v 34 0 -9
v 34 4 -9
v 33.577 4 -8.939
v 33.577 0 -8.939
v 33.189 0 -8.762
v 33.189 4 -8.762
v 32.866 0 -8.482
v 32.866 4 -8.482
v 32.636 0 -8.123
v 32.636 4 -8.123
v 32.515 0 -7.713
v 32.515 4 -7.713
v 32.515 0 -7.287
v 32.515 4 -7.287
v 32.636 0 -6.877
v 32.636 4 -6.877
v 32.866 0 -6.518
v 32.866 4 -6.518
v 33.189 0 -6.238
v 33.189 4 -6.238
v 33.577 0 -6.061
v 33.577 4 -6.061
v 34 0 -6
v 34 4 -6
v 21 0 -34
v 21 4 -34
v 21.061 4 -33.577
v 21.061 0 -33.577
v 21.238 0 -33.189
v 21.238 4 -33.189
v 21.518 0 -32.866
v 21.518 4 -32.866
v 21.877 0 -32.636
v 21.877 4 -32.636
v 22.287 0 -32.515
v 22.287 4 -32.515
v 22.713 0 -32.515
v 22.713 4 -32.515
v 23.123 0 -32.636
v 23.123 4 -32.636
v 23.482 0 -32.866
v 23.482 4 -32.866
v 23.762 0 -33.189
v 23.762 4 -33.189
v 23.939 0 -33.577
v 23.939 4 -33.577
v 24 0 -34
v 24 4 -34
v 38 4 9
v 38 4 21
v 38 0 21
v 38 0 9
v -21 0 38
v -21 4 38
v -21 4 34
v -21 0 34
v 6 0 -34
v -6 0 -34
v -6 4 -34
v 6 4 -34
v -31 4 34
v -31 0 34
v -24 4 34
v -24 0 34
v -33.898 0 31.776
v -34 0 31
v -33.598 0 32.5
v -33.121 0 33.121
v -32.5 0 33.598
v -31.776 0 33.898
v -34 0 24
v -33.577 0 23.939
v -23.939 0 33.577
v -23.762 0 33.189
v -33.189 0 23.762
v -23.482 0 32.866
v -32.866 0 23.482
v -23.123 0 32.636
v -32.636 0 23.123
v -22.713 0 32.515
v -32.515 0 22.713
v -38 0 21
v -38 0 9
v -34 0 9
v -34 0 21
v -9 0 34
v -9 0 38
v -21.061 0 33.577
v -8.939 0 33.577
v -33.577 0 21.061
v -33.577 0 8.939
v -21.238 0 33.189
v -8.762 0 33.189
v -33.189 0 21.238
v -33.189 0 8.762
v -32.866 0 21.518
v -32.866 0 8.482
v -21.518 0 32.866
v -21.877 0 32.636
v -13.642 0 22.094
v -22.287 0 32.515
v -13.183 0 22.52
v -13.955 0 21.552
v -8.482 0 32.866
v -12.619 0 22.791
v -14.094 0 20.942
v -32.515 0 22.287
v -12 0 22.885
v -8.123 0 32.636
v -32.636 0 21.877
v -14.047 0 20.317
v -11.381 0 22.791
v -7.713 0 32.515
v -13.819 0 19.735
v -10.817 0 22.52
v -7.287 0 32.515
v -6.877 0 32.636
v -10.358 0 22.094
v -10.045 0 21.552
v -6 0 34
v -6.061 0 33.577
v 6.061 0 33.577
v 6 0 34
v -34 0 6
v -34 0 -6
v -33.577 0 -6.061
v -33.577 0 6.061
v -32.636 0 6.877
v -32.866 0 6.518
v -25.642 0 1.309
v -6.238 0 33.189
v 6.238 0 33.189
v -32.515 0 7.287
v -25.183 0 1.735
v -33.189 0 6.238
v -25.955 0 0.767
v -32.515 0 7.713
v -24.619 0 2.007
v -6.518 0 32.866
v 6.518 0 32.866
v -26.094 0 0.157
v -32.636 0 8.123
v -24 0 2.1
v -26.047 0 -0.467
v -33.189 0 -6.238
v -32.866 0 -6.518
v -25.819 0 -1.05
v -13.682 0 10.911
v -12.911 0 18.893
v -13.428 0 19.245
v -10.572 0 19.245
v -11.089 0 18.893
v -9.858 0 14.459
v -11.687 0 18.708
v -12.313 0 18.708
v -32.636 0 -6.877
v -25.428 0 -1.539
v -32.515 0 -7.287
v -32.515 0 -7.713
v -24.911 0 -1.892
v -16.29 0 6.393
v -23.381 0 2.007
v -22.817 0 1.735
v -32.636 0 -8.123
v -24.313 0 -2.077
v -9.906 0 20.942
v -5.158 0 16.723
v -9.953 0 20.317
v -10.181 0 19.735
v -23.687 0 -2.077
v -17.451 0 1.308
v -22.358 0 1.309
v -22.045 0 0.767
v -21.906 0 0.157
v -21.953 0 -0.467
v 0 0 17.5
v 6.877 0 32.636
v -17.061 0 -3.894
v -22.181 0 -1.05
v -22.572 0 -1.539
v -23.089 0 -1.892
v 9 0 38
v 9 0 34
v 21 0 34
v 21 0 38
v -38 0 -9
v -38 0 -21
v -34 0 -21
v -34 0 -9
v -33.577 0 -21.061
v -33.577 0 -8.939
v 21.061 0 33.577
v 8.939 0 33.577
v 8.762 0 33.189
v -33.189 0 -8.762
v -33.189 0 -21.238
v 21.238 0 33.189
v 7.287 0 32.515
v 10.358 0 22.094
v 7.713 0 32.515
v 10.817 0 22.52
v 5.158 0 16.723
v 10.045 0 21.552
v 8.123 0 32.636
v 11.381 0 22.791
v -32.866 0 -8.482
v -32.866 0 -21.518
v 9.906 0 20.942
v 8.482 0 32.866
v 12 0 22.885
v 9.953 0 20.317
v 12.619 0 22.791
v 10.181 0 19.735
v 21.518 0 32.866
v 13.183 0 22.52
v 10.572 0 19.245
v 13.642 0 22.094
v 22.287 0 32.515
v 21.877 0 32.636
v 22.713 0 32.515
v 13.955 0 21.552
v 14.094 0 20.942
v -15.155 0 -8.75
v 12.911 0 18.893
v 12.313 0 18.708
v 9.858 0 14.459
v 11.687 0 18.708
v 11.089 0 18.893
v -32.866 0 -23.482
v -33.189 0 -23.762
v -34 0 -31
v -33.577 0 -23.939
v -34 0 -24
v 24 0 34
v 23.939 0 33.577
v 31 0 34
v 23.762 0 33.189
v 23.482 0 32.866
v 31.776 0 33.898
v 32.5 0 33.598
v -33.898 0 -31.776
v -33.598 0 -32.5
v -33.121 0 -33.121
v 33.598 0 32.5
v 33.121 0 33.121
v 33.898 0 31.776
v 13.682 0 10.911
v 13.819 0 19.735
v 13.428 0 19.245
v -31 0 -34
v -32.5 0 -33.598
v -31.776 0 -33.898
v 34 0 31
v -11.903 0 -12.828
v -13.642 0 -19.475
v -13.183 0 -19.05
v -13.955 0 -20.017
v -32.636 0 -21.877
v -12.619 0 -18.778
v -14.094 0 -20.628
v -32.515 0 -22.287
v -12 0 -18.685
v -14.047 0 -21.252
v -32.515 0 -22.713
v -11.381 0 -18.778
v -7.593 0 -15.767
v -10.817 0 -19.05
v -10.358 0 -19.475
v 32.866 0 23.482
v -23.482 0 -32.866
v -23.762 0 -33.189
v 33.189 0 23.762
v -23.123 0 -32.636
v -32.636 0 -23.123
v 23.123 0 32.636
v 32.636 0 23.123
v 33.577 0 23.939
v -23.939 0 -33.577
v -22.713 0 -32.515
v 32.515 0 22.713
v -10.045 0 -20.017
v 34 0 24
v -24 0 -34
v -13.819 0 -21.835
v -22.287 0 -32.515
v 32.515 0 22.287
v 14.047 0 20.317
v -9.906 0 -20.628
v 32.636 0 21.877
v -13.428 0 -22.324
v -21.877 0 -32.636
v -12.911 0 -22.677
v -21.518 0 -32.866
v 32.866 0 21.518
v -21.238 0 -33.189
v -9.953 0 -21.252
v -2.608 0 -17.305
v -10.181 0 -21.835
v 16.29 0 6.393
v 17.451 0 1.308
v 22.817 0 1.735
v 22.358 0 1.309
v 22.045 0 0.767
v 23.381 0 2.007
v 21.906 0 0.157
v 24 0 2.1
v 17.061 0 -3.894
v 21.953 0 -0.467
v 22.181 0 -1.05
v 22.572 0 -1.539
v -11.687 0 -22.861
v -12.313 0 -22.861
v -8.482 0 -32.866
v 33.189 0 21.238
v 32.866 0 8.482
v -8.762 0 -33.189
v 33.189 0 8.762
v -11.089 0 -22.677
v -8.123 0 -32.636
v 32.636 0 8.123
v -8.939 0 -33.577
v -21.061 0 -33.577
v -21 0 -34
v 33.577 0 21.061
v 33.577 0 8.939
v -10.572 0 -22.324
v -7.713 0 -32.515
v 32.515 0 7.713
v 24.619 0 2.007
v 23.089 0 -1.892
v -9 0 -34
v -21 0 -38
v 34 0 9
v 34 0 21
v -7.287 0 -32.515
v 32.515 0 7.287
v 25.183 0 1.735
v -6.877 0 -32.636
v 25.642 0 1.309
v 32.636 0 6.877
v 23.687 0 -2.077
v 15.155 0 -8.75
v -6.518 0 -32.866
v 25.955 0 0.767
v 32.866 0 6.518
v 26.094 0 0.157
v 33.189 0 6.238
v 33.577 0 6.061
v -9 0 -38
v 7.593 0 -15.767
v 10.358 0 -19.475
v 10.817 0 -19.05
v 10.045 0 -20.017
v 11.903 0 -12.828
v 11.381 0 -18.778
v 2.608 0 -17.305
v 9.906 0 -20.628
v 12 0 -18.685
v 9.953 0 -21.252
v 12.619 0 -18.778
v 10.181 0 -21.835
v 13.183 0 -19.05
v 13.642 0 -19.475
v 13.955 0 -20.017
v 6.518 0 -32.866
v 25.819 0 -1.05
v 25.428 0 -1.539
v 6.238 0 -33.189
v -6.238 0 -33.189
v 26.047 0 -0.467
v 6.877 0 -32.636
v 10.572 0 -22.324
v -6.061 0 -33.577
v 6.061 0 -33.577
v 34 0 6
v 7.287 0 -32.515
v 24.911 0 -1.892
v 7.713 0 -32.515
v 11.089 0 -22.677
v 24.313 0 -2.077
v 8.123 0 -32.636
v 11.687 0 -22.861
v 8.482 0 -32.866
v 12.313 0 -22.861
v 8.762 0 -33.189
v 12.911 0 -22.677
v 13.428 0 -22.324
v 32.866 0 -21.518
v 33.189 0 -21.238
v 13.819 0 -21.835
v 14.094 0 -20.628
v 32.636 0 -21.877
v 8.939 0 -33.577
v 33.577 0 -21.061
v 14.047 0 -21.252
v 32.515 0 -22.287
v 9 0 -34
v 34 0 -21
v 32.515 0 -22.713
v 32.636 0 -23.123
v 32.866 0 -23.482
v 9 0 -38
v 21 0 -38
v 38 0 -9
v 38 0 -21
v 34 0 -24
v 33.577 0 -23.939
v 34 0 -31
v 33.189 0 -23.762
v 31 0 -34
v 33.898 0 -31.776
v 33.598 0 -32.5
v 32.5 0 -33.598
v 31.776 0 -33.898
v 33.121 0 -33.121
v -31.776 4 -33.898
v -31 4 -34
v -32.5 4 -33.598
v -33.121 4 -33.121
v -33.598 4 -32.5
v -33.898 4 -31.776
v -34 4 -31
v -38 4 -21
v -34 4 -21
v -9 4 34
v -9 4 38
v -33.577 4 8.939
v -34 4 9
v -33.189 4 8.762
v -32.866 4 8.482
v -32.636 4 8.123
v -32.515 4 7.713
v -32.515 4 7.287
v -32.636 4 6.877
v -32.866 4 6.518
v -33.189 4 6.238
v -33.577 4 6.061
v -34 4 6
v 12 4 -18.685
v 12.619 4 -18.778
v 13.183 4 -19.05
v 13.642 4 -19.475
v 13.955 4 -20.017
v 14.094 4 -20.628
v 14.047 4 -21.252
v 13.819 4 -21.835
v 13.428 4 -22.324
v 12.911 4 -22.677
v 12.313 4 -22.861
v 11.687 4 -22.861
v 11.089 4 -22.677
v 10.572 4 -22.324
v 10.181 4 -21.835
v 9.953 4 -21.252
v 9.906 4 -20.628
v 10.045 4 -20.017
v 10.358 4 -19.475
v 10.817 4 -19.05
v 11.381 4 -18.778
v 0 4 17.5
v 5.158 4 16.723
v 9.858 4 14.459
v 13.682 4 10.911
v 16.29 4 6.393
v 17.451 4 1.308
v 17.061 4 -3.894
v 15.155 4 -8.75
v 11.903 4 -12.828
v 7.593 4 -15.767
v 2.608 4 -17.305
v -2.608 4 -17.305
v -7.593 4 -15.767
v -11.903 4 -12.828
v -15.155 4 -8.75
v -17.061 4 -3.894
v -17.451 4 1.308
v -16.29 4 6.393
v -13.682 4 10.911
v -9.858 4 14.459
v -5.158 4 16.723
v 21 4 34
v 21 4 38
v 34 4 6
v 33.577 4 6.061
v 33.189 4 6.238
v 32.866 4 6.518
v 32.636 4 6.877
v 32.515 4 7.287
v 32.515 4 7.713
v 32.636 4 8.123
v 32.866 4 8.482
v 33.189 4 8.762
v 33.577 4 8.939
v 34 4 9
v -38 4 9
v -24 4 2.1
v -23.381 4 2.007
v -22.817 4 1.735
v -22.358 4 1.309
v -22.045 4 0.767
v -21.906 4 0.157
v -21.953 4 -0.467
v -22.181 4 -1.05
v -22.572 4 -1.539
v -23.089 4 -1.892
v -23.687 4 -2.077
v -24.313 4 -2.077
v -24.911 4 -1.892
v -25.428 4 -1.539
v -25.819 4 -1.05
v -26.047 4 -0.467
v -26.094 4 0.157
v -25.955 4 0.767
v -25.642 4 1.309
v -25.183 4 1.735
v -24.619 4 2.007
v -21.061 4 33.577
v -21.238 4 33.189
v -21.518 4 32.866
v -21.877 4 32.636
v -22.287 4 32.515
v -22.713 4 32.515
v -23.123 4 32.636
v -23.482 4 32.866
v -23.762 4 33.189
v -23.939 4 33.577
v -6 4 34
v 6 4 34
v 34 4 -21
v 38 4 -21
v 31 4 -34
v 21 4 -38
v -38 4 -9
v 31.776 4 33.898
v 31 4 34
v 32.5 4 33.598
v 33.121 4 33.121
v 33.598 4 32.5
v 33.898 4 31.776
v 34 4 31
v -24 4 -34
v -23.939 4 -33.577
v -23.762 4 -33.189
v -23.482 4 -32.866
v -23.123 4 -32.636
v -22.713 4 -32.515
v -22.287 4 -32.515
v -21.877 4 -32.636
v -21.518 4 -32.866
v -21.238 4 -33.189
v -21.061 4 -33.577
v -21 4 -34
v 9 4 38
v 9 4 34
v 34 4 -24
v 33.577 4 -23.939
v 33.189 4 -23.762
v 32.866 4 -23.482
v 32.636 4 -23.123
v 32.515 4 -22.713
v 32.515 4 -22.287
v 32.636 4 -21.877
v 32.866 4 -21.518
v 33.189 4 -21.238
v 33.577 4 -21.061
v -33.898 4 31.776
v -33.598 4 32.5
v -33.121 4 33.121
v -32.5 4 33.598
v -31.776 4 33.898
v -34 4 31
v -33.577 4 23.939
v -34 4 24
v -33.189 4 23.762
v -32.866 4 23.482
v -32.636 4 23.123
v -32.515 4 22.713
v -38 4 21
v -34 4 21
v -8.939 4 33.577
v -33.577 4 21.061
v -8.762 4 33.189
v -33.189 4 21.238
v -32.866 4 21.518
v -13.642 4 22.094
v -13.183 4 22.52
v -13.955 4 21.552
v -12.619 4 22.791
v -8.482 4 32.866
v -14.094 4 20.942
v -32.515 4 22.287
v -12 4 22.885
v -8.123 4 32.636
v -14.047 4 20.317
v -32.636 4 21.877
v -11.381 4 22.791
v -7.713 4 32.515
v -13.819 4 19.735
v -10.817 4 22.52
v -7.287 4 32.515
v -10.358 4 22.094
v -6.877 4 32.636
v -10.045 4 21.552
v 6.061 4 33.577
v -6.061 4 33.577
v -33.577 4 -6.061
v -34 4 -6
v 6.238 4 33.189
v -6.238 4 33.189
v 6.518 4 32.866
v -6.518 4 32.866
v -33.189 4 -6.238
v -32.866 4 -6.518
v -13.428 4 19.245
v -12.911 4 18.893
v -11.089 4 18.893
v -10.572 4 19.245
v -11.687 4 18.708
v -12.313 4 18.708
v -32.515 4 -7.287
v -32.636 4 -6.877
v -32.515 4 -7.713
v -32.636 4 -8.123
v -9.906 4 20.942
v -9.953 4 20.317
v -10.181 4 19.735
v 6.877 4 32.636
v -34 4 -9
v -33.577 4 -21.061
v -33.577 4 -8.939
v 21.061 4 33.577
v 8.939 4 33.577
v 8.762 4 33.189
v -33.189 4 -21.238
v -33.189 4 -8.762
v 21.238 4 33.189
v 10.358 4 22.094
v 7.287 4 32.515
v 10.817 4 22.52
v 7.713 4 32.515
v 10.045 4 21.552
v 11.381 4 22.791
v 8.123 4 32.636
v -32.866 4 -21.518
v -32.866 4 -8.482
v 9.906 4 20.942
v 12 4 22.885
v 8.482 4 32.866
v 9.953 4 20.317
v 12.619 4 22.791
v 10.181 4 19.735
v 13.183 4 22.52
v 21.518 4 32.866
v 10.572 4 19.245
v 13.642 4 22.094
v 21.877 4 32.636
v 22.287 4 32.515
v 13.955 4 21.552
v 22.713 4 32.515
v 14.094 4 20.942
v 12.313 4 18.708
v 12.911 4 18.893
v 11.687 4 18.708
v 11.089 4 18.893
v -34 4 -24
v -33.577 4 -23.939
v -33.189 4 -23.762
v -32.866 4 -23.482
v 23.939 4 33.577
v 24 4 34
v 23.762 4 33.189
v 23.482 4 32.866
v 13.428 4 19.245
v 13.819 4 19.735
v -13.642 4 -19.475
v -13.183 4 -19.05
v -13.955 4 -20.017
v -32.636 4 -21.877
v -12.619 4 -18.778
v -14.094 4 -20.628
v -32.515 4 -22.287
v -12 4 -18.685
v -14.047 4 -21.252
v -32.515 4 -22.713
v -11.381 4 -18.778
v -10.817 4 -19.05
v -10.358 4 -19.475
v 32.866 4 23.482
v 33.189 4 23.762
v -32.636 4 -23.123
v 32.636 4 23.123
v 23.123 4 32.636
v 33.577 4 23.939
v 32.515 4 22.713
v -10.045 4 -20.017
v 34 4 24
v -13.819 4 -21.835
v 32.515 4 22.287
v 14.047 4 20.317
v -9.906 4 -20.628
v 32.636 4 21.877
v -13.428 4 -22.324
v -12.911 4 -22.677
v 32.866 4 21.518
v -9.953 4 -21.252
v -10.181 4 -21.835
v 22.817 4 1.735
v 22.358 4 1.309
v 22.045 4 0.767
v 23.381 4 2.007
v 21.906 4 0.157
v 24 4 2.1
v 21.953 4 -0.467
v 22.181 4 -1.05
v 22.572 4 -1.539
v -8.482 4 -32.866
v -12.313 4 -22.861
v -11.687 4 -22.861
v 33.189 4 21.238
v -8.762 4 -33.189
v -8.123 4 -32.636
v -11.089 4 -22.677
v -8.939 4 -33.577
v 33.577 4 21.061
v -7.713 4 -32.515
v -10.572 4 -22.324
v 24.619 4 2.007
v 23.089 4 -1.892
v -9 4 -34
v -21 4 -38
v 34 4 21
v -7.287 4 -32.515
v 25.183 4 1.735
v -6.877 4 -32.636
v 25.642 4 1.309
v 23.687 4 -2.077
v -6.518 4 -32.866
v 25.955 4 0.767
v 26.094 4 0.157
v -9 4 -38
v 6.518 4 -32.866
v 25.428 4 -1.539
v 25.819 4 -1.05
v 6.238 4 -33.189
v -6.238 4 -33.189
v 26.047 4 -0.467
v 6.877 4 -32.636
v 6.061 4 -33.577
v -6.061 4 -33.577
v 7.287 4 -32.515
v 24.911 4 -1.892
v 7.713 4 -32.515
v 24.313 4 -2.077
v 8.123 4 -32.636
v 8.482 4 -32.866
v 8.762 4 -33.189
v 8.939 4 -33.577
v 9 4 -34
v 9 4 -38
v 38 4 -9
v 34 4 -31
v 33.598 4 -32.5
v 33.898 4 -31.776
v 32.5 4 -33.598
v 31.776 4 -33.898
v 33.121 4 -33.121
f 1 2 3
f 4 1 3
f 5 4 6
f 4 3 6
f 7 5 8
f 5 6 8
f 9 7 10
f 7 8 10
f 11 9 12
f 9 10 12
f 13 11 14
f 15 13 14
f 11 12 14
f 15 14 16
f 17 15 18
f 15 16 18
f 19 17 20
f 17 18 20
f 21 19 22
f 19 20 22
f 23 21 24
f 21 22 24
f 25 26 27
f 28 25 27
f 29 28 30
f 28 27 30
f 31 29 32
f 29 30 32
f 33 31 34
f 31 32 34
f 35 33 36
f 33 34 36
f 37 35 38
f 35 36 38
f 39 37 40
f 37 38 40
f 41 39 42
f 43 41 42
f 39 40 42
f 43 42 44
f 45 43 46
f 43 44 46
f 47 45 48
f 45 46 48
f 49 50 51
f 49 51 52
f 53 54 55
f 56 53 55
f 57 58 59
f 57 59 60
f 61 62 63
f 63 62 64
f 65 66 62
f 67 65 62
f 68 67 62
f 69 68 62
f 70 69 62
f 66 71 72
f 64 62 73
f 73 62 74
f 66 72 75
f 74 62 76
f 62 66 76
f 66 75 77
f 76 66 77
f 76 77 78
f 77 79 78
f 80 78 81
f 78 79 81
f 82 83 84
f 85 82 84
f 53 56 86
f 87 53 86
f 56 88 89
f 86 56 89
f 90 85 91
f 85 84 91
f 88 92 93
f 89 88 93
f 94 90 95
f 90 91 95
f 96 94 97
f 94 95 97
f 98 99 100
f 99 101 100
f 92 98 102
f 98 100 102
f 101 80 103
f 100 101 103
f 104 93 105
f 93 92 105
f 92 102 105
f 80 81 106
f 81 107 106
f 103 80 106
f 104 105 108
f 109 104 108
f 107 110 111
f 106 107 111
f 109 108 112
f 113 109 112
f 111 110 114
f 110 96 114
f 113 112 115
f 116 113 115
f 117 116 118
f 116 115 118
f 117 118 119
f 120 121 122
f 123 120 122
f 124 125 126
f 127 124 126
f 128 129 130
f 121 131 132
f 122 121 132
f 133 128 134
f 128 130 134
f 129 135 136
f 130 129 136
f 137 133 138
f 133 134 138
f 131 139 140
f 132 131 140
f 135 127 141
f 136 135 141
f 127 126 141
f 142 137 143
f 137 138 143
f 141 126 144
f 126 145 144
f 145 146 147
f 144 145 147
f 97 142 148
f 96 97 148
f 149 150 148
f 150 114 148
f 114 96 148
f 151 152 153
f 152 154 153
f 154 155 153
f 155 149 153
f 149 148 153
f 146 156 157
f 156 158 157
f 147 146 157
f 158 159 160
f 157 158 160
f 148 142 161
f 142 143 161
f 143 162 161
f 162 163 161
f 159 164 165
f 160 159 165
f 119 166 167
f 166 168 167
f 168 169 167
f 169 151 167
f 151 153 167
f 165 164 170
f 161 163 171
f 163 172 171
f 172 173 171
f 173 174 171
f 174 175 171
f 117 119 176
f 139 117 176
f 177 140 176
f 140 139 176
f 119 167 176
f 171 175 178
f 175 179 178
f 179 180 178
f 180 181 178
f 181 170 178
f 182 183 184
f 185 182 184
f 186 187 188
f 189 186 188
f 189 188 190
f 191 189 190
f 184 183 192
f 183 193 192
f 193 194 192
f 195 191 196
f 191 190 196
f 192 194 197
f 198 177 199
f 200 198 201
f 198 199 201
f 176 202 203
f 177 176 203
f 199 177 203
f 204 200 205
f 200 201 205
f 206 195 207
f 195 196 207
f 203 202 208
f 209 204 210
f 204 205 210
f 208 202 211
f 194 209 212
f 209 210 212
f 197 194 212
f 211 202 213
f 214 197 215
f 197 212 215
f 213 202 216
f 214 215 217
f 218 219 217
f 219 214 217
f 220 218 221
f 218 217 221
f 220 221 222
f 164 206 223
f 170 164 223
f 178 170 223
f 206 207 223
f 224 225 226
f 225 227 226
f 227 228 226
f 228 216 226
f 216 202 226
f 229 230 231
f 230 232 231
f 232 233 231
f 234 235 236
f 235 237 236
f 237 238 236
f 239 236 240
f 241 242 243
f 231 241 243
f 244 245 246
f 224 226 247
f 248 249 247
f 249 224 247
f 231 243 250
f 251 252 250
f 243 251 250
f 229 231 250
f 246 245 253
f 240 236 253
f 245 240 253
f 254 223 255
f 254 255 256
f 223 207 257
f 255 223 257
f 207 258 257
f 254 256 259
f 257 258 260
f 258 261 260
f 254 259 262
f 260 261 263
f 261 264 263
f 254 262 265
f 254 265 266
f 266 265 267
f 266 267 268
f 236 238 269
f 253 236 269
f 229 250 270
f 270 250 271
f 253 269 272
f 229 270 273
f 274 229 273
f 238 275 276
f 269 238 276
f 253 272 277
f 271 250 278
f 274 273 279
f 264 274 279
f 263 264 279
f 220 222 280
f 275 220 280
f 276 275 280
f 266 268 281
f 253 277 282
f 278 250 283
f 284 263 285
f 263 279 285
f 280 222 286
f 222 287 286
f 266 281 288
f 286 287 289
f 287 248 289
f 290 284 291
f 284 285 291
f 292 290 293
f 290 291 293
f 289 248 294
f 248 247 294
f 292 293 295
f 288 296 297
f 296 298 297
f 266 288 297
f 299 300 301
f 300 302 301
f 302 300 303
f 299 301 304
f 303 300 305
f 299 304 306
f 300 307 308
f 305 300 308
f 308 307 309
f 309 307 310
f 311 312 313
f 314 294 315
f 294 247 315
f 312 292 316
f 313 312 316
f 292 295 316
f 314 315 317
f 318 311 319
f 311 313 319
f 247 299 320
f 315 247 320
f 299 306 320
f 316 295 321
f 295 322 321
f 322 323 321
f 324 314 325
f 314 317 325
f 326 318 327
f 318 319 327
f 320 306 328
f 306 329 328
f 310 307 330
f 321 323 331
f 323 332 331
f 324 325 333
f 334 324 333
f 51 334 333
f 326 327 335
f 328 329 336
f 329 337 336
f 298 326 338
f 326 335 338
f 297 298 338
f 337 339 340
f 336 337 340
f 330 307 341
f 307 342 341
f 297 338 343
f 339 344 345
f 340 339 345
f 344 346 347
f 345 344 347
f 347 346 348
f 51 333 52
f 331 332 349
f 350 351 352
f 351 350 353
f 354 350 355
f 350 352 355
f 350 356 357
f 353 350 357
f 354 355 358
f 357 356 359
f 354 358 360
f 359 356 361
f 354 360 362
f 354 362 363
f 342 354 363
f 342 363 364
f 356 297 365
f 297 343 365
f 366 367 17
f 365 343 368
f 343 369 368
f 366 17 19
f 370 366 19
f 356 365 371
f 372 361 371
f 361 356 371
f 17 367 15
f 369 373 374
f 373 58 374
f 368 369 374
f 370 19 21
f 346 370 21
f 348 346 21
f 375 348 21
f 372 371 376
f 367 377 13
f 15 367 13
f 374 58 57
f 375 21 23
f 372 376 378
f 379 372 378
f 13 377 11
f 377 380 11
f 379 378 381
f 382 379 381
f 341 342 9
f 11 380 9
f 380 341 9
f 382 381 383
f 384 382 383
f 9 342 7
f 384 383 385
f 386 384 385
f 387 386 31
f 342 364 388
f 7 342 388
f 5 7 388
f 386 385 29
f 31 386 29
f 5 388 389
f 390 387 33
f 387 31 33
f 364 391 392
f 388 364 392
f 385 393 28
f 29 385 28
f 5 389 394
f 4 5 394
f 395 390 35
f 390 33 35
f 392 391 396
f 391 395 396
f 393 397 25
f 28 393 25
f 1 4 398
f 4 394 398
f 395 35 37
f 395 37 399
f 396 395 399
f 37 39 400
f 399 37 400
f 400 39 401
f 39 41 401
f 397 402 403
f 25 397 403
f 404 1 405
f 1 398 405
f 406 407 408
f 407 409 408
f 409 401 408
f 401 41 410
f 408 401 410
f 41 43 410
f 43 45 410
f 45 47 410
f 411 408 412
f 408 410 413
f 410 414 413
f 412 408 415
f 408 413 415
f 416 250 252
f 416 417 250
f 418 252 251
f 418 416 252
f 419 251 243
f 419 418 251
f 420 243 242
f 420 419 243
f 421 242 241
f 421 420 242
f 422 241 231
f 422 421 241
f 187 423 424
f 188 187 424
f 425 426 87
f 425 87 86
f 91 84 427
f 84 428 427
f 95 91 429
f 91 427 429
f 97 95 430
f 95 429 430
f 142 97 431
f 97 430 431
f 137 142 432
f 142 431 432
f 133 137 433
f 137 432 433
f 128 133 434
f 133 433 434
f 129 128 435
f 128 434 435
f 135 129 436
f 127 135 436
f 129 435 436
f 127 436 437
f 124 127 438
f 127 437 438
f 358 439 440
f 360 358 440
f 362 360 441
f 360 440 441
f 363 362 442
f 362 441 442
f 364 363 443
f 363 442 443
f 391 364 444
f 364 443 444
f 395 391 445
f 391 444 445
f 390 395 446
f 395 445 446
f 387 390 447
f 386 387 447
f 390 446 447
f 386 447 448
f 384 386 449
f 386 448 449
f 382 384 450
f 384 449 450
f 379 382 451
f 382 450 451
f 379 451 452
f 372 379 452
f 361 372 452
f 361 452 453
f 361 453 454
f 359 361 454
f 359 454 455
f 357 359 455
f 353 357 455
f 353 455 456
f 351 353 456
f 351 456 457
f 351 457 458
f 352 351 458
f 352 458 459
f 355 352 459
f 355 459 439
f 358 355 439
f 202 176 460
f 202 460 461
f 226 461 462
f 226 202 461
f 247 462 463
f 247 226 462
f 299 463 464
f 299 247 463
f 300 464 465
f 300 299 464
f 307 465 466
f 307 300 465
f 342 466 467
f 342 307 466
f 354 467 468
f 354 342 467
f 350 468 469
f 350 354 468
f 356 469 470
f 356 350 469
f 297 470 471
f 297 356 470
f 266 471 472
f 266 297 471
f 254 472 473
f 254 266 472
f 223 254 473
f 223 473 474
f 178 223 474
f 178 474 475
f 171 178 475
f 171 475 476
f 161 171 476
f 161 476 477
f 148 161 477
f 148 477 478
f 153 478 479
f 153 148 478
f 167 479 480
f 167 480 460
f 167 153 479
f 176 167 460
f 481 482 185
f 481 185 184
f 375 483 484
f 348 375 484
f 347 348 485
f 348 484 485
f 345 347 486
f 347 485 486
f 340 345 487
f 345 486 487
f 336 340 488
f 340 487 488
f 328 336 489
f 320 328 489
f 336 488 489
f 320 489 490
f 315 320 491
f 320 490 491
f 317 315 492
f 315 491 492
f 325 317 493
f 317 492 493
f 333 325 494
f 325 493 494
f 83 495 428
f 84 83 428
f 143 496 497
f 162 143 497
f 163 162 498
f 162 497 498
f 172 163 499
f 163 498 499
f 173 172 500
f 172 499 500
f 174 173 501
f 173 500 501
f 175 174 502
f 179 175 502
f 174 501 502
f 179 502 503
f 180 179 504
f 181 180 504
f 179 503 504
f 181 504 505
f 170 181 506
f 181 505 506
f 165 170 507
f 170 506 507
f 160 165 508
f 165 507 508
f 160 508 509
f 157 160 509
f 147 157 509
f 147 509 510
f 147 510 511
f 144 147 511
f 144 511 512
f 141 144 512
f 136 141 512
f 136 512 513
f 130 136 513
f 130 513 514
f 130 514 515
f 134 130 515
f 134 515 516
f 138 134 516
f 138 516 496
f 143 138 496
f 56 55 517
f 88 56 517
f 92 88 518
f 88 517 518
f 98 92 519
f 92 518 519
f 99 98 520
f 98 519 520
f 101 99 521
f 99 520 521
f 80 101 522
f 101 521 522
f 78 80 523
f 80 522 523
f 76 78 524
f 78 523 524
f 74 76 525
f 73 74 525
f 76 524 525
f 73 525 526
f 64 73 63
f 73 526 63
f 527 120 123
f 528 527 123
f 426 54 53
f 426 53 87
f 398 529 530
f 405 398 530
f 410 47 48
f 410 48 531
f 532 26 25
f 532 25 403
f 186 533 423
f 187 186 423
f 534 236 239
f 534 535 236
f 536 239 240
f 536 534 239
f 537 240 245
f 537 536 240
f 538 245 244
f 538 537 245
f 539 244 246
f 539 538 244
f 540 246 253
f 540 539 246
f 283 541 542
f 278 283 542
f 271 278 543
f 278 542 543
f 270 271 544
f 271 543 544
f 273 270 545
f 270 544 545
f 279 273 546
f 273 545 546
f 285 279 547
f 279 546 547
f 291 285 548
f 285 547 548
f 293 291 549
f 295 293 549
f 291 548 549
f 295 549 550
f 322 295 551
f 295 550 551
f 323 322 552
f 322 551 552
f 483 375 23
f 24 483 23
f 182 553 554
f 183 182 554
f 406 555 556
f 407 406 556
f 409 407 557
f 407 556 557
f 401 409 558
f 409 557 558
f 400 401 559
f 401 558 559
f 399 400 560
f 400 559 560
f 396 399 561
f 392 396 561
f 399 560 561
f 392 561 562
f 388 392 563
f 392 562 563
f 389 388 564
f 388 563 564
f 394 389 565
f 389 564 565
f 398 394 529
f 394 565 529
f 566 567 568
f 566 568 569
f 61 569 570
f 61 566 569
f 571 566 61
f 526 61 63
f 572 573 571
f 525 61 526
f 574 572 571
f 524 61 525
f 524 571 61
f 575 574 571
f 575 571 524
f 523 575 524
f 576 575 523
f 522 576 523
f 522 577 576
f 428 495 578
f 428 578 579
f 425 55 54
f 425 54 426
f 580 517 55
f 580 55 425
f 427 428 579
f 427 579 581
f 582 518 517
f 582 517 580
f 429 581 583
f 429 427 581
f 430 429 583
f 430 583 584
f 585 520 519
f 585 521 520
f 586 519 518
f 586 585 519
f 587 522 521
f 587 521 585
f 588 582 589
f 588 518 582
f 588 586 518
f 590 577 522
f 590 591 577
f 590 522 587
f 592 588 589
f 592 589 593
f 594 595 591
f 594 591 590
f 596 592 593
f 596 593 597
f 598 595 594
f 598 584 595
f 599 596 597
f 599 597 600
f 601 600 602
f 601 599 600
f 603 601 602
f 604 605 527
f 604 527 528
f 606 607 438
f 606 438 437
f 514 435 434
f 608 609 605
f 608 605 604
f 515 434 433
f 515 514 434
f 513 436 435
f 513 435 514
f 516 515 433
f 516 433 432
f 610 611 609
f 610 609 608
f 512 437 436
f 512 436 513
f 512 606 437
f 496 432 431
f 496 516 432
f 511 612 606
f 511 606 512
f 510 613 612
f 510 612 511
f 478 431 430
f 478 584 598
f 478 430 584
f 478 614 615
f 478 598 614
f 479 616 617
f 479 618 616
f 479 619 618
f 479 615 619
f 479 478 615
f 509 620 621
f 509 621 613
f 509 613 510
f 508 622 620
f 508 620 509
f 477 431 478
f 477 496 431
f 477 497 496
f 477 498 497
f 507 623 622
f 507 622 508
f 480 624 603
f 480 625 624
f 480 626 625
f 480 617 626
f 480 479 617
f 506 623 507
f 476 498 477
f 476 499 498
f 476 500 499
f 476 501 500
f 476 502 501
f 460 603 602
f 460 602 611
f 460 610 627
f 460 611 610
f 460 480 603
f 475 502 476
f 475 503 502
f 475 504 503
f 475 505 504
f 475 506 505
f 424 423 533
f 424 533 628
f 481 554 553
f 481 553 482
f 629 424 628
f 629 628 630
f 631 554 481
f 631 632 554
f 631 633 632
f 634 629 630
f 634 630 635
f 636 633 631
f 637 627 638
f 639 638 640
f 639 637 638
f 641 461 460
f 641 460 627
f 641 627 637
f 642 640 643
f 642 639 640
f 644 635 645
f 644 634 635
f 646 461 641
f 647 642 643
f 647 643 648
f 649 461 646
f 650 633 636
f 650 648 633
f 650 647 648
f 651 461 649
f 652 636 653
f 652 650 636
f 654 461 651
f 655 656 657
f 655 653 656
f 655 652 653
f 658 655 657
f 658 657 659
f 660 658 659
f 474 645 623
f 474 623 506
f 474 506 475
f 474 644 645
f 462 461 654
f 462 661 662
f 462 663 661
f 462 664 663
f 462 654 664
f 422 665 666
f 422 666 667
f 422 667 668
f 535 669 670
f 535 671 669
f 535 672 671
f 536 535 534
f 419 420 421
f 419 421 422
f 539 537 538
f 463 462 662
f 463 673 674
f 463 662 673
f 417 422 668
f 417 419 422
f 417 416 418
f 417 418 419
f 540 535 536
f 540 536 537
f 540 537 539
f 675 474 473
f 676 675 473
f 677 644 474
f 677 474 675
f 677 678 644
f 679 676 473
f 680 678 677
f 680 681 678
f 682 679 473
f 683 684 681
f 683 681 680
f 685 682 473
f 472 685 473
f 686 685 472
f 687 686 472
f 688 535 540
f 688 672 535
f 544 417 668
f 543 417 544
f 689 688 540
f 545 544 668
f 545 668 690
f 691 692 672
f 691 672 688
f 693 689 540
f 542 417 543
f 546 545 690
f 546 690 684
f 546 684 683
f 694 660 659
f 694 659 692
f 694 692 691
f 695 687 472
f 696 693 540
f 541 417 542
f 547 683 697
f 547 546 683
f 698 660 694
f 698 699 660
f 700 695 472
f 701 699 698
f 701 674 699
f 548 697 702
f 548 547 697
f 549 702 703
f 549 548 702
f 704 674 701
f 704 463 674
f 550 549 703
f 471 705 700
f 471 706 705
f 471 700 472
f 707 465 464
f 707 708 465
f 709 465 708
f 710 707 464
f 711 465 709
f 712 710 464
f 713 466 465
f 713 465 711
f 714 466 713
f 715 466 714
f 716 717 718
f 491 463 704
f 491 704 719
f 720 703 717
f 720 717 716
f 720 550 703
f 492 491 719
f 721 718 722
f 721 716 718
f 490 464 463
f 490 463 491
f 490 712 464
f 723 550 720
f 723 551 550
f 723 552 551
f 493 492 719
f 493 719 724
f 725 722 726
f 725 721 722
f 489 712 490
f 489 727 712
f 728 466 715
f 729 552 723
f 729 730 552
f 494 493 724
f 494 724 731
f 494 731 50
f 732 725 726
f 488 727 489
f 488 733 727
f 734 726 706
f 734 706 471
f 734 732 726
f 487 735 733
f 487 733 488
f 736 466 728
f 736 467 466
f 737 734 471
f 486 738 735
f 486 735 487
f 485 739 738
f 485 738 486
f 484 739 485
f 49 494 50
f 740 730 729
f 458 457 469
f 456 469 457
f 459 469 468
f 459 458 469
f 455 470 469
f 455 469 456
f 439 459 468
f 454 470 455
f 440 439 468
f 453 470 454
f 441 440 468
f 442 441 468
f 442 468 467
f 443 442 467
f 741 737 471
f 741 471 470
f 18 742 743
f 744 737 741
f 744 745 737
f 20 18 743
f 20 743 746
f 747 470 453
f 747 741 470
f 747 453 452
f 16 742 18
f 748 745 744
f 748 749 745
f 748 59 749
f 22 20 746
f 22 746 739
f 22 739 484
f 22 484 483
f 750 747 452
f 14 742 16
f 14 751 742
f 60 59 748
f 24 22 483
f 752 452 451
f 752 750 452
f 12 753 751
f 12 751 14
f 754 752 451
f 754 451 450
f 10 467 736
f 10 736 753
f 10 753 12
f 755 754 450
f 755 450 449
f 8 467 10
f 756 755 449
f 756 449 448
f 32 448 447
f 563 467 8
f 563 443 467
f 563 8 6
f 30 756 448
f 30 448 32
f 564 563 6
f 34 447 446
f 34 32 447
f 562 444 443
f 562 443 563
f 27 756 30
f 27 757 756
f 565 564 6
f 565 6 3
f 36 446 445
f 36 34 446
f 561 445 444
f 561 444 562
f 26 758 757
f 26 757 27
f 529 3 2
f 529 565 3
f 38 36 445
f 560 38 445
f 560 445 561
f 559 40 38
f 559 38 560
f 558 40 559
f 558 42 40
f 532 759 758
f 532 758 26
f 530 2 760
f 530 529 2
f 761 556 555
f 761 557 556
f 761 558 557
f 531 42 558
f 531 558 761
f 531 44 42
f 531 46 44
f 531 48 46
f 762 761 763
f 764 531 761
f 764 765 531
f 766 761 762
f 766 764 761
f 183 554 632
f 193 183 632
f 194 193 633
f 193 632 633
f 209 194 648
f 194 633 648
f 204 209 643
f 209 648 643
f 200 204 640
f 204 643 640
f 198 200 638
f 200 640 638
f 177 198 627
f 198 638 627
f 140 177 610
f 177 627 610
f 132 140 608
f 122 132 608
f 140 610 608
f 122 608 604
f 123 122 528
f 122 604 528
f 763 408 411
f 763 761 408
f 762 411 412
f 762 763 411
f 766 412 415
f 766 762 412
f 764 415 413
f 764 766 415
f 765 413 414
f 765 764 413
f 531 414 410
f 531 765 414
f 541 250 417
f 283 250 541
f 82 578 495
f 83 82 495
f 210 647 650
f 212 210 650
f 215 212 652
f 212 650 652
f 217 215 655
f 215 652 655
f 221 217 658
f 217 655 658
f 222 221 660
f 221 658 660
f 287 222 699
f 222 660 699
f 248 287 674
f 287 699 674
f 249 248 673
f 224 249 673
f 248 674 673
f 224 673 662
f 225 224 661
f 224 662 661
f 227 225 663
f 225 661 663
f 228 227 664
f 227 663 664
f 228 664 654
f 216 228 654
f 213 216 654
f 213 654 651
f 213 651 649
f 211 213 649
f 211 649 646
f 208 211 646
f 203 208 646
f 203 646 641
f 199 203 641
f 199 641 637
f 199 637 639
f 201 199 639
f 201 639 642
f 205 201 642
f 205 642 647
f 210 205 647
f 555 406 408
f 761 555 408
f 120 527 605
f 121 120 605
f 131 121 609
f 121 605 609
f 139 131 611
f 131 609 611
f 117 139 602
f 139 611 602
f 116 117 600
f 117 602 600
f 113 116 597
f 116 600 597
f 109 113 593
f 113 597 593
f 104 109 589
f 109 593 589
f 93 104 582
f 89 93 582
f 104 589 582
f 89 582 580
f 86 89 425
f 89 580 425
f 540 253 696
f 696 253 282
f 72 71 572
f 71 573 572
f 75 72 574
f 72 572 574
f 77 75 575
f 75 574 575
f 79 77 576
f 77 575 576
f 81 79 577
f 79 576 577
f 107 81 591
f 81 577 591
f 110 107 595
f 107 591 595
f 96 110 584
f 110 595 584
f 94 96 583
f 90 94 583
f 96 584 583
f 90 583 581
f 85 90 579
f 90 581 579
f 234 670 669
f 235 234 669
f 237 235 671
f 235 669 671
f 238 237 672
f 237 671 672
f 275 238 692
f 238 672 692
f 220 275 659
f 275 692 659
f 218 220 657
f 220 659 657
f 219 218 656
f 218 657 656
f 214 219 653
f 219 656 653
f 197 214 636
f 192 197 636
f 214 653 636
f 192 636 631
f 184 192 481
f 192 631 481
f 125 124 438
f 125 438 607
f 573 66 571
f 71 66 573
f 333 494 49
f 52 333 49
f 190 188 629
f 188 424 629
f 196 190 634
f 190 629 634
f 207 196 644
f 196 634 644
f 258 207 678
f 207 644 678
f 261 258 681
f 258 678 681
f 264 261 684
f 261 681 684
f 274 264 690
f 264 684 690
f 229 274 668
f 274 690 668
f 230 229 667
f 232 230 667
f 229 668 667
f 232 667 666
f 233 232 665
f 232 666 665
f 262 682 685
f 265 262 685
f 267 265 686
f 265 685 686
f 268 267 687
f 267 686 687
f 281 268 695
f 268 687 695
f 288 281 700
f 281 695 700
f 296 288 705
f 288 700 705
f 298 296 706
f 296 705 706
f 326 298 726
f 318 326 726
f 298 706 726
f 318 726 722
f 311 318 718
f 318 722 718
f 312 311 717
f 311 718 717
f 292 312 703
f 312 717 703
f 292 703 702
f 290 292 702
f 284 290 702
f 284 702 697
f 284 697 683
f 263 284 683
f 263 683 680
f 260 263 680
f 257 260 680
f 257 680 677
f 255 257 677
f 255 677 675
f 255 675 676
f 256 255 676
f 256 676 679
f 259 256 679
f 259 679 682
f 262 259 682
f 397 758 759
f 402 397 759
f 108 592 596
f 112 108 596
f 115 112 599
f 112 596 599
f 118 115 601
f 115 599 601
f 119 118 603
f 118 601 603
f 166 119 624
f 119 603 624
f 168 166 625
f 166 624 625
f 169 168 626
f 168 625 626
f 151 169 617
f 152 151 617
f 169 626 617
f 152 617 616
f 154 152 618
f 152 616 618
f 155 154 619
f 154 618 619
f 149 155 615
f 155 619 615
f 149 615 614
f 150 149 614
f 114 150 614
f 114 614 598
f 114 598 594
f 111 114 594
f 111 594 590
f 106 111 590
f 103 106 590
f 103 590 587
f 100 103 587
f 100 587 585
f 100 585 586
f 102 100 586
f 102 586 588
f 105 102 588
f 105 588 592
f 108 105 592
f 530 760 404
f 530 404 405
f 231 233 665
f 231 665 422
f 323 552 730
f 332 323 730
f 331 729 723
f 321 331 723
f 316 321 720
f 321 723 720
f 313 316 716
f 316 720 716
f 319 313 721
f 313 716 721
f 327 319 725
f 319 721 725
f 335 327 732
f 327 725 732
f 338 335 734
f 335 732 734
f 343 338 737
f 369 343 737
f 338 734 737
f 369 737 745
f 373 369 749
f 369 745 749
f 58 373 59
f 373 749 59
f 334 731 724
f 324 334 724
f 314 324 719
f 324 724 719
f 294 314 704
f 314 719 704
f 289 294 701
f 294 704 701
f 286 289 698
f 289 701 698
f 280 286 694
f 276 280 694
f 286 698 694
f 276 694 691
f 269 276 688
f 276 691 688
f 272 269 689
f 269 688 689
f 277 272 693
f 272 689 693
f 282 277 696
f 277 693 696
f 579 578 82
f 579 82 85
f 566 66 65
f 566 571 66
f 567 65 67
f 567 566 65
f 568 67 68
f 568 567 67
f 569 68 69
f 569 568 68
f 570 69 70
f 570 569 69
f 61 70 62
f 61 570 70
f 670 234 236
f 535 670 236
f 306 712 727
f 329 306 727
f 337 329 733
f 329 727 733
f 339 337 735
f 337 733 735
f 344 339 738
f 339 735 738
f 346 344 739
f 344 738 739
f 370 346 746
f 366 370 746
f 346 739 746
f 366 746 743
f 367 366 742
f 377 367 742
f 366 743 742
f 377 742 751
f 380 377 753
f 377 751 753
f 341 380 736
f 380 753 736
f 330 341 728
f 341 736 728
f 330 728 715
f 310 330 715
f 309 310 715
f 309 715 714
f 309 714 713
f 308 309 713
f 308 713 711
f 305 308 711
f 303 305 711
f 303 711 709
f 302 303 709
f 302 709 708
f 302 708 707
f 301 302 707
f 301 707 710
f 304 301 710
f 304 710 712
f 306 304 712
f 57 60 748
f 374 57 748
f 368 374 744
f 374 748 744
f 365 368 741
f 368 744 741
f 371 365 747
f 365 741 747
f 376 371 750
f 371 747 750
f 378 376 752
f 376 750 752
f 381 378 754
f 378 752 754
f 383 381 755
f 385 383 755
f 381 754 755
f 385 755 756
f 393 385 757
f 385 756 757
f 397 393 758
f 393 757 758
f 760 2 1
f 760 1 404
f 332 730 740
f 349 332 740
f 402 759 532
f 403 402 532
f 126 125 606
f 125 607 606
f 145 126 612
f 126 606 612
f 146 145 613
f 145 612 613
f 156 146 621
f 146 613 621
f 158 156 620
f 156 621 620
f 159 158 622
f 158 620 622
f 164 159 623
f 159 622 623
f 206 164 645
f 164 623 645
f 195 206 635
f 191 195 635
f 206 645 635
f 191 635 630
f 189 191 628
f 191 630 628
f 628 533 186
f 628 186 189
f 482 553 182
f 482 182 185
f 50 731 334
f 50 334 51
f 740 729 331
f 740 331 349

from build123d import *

# Parameters (mm, degrees)
SKETCH_1_W          = 68
SKETCH_1_H          = 68
SKETCH_1_R          = 17.5
EXTRUDE_1_DEPTH     = 4
SKETCH_2_W          = 12
SKETCH_2_H          = 4
SKETCH_2_W_2        = 4
SKETCH_2_H_2        = 12
EXTRUDE_2_DEPTH     = 4
SKETCH_3_R          = 1.5
CUT_EXTRUDE_1_DEPTH = 4
FILLET_1_R          = 3
SKETCH_4_R          = 2.1
CUT_EXTRUDE_2_DEPTH = 10


with BuildPart() as part:
    # 草图1 → 凸台-拉伸1 (new body)
    with BuildSketch(Plane(origin=(0, 0, 0), x_dir=(1, 0, 0), z_dir=(0, 1, 0))):
        Rectangle(SKETCH_1_W, SKETCH_1_H)
        with Locations(Location((0, 0, 0), (0, 0, 270))):
            Circle(SKETCH_1_R, mode=Mode.SUBTRACT)
    extrude(amount=EXTRUDE_1_DEPTH)

    # 草图2 → 凸台-拉伸2 (add)
    with BuildSketch(Plane(origin=(0, 4, 0), x_dir=(1, 0, 0), z_dir=(0, 1, 0))):
        with Locations((-15, 36)):
            Rectangle(SKETCH_2_W, SKETCH_2_H)
        with Locations((15, 36)):
            Rectangle(SKETCH_2_W, SKETCH_2_H)
        with Locations((36, 15)):
            Rectangle(SKETCH_2_W_2, SKETCH_2_H_2)
        with Locations((36, -15)):
            Rectangle(SKETCH_2_W_2, SKETCH_2_H_2)
        with Locations((15, -36)):
            Rectangle(SKETCH_2_W, SKETCH_2_H)
        with Locations((-15, -36)):
            Rectangle(SKETCH_2_W, SKETCH_2_H)
        with Locations((-36, -15)):
            Rectangle(SKETCH_2_W_2, SKETCH_2_H_2)
        with Locations((-36, 15)):
            Rectangle(SKETCH_2_W_2, SKETCH_2_H_2)
    extrude(amount=-EXTRUDE_2_DEPTH)

    # 草图3 → 切除-拉伸1 (cut)
    with BuildSketch(Plane(origin=(0, 4, 0), x_dir=(1, 0, 0), z_dir=(0, 1, 0))):
        with Locations((-22.5, 34)):
            Circle(SKETCH_3_R)
        with Locations((-7.5, 34)):
            Circle(SKETCH_3_R)
        with Locations((7.5, 34)):
            Circle(SKETCH_3_R)
        with Locations((22.5, 34)):
            Circle(SKETCH_3_R)
        with Locations((34, 22.5)):
            Circle(SKETCH_3_R)
        with Locations((34, 7.5)):
            Circle(SKETCH_3_R)
        with Locations((34, -7.5)):
            Circle(SKETCH_3_R)
        with Locations((34, -22.5)):
            Circle(SKETCH_3_R)
        with Locations((22.5, -34)):
            Circle(SKETCH_3_R)
        with Locations((7.5, -34)):
            Circle(SKETCH_3_R)
        with Locations((-7.5, -34)):
            Circle(SKETCH_3_R)
        with Locations((-22.5, -34)):
            Circle(SKETCH_3_R)
        with Locations((-34, -22.5)):
            Circle(SKETCH_3_R)
        with Locations((-34, -7.5)):
            Circle(SKETCH_3_R)
        with Locations((-34, 7.5)):
            Circle(SKETCH_3_R)
        with Locations((-34, 22.5)):
            Circle(SKETCH_3_R)
    extrude(amount=-CUT_EXTRUDE_1_DEPTH, mode=Mode.SUBTRACT)

    # 圆角1
    fillet_1_edges = [part.edges().sort_by_distance(p)[0] for p in [
        (34, 2, 34),
        (-34, 2, 34),
        (-34, 2, -34),
        (34, 2, -34),
    ]]
    fillet(fillet_1_edges, radius=FILLET_1_R)

    # 草图4 → 切除-拉伸2 (cut)
    with BuildSketch(Plane(origin=(0, 4, 0), x_dir=(1, 0, 0), z_dir=(0, 1, 0))):
        with Locations(Location((24, 0, 0), (0, 0, 270))):
            Circle(SKETCH_4_R)
        with Locations(Location((12, -20.784609691, 0), (0, 0, 270))):
            Circle(SKETCH_4_R)
        with Locations(Location((-12, -20.784609691, 0), (0, 0, 270))):
            Circle(SKETCH_4_R)
        with Locations(Location((-24, 0, 0), (0, 0, 270))):
            Circle(SKETCH_4_R)
        with Locations(Location((-12, 20.784609691, 0), (0, 0, 270))):
            Circle(SKETCH_4_R)
        with Locations(Location((12, 20.784609691, 0), (0, 0, 270))):
            Circle(SKETCH_4_R)
    extrude(amount=-CUT_EXTRUDE_2_DEPTH, mode=Mode.SUBTRACT)


solid = part.part
